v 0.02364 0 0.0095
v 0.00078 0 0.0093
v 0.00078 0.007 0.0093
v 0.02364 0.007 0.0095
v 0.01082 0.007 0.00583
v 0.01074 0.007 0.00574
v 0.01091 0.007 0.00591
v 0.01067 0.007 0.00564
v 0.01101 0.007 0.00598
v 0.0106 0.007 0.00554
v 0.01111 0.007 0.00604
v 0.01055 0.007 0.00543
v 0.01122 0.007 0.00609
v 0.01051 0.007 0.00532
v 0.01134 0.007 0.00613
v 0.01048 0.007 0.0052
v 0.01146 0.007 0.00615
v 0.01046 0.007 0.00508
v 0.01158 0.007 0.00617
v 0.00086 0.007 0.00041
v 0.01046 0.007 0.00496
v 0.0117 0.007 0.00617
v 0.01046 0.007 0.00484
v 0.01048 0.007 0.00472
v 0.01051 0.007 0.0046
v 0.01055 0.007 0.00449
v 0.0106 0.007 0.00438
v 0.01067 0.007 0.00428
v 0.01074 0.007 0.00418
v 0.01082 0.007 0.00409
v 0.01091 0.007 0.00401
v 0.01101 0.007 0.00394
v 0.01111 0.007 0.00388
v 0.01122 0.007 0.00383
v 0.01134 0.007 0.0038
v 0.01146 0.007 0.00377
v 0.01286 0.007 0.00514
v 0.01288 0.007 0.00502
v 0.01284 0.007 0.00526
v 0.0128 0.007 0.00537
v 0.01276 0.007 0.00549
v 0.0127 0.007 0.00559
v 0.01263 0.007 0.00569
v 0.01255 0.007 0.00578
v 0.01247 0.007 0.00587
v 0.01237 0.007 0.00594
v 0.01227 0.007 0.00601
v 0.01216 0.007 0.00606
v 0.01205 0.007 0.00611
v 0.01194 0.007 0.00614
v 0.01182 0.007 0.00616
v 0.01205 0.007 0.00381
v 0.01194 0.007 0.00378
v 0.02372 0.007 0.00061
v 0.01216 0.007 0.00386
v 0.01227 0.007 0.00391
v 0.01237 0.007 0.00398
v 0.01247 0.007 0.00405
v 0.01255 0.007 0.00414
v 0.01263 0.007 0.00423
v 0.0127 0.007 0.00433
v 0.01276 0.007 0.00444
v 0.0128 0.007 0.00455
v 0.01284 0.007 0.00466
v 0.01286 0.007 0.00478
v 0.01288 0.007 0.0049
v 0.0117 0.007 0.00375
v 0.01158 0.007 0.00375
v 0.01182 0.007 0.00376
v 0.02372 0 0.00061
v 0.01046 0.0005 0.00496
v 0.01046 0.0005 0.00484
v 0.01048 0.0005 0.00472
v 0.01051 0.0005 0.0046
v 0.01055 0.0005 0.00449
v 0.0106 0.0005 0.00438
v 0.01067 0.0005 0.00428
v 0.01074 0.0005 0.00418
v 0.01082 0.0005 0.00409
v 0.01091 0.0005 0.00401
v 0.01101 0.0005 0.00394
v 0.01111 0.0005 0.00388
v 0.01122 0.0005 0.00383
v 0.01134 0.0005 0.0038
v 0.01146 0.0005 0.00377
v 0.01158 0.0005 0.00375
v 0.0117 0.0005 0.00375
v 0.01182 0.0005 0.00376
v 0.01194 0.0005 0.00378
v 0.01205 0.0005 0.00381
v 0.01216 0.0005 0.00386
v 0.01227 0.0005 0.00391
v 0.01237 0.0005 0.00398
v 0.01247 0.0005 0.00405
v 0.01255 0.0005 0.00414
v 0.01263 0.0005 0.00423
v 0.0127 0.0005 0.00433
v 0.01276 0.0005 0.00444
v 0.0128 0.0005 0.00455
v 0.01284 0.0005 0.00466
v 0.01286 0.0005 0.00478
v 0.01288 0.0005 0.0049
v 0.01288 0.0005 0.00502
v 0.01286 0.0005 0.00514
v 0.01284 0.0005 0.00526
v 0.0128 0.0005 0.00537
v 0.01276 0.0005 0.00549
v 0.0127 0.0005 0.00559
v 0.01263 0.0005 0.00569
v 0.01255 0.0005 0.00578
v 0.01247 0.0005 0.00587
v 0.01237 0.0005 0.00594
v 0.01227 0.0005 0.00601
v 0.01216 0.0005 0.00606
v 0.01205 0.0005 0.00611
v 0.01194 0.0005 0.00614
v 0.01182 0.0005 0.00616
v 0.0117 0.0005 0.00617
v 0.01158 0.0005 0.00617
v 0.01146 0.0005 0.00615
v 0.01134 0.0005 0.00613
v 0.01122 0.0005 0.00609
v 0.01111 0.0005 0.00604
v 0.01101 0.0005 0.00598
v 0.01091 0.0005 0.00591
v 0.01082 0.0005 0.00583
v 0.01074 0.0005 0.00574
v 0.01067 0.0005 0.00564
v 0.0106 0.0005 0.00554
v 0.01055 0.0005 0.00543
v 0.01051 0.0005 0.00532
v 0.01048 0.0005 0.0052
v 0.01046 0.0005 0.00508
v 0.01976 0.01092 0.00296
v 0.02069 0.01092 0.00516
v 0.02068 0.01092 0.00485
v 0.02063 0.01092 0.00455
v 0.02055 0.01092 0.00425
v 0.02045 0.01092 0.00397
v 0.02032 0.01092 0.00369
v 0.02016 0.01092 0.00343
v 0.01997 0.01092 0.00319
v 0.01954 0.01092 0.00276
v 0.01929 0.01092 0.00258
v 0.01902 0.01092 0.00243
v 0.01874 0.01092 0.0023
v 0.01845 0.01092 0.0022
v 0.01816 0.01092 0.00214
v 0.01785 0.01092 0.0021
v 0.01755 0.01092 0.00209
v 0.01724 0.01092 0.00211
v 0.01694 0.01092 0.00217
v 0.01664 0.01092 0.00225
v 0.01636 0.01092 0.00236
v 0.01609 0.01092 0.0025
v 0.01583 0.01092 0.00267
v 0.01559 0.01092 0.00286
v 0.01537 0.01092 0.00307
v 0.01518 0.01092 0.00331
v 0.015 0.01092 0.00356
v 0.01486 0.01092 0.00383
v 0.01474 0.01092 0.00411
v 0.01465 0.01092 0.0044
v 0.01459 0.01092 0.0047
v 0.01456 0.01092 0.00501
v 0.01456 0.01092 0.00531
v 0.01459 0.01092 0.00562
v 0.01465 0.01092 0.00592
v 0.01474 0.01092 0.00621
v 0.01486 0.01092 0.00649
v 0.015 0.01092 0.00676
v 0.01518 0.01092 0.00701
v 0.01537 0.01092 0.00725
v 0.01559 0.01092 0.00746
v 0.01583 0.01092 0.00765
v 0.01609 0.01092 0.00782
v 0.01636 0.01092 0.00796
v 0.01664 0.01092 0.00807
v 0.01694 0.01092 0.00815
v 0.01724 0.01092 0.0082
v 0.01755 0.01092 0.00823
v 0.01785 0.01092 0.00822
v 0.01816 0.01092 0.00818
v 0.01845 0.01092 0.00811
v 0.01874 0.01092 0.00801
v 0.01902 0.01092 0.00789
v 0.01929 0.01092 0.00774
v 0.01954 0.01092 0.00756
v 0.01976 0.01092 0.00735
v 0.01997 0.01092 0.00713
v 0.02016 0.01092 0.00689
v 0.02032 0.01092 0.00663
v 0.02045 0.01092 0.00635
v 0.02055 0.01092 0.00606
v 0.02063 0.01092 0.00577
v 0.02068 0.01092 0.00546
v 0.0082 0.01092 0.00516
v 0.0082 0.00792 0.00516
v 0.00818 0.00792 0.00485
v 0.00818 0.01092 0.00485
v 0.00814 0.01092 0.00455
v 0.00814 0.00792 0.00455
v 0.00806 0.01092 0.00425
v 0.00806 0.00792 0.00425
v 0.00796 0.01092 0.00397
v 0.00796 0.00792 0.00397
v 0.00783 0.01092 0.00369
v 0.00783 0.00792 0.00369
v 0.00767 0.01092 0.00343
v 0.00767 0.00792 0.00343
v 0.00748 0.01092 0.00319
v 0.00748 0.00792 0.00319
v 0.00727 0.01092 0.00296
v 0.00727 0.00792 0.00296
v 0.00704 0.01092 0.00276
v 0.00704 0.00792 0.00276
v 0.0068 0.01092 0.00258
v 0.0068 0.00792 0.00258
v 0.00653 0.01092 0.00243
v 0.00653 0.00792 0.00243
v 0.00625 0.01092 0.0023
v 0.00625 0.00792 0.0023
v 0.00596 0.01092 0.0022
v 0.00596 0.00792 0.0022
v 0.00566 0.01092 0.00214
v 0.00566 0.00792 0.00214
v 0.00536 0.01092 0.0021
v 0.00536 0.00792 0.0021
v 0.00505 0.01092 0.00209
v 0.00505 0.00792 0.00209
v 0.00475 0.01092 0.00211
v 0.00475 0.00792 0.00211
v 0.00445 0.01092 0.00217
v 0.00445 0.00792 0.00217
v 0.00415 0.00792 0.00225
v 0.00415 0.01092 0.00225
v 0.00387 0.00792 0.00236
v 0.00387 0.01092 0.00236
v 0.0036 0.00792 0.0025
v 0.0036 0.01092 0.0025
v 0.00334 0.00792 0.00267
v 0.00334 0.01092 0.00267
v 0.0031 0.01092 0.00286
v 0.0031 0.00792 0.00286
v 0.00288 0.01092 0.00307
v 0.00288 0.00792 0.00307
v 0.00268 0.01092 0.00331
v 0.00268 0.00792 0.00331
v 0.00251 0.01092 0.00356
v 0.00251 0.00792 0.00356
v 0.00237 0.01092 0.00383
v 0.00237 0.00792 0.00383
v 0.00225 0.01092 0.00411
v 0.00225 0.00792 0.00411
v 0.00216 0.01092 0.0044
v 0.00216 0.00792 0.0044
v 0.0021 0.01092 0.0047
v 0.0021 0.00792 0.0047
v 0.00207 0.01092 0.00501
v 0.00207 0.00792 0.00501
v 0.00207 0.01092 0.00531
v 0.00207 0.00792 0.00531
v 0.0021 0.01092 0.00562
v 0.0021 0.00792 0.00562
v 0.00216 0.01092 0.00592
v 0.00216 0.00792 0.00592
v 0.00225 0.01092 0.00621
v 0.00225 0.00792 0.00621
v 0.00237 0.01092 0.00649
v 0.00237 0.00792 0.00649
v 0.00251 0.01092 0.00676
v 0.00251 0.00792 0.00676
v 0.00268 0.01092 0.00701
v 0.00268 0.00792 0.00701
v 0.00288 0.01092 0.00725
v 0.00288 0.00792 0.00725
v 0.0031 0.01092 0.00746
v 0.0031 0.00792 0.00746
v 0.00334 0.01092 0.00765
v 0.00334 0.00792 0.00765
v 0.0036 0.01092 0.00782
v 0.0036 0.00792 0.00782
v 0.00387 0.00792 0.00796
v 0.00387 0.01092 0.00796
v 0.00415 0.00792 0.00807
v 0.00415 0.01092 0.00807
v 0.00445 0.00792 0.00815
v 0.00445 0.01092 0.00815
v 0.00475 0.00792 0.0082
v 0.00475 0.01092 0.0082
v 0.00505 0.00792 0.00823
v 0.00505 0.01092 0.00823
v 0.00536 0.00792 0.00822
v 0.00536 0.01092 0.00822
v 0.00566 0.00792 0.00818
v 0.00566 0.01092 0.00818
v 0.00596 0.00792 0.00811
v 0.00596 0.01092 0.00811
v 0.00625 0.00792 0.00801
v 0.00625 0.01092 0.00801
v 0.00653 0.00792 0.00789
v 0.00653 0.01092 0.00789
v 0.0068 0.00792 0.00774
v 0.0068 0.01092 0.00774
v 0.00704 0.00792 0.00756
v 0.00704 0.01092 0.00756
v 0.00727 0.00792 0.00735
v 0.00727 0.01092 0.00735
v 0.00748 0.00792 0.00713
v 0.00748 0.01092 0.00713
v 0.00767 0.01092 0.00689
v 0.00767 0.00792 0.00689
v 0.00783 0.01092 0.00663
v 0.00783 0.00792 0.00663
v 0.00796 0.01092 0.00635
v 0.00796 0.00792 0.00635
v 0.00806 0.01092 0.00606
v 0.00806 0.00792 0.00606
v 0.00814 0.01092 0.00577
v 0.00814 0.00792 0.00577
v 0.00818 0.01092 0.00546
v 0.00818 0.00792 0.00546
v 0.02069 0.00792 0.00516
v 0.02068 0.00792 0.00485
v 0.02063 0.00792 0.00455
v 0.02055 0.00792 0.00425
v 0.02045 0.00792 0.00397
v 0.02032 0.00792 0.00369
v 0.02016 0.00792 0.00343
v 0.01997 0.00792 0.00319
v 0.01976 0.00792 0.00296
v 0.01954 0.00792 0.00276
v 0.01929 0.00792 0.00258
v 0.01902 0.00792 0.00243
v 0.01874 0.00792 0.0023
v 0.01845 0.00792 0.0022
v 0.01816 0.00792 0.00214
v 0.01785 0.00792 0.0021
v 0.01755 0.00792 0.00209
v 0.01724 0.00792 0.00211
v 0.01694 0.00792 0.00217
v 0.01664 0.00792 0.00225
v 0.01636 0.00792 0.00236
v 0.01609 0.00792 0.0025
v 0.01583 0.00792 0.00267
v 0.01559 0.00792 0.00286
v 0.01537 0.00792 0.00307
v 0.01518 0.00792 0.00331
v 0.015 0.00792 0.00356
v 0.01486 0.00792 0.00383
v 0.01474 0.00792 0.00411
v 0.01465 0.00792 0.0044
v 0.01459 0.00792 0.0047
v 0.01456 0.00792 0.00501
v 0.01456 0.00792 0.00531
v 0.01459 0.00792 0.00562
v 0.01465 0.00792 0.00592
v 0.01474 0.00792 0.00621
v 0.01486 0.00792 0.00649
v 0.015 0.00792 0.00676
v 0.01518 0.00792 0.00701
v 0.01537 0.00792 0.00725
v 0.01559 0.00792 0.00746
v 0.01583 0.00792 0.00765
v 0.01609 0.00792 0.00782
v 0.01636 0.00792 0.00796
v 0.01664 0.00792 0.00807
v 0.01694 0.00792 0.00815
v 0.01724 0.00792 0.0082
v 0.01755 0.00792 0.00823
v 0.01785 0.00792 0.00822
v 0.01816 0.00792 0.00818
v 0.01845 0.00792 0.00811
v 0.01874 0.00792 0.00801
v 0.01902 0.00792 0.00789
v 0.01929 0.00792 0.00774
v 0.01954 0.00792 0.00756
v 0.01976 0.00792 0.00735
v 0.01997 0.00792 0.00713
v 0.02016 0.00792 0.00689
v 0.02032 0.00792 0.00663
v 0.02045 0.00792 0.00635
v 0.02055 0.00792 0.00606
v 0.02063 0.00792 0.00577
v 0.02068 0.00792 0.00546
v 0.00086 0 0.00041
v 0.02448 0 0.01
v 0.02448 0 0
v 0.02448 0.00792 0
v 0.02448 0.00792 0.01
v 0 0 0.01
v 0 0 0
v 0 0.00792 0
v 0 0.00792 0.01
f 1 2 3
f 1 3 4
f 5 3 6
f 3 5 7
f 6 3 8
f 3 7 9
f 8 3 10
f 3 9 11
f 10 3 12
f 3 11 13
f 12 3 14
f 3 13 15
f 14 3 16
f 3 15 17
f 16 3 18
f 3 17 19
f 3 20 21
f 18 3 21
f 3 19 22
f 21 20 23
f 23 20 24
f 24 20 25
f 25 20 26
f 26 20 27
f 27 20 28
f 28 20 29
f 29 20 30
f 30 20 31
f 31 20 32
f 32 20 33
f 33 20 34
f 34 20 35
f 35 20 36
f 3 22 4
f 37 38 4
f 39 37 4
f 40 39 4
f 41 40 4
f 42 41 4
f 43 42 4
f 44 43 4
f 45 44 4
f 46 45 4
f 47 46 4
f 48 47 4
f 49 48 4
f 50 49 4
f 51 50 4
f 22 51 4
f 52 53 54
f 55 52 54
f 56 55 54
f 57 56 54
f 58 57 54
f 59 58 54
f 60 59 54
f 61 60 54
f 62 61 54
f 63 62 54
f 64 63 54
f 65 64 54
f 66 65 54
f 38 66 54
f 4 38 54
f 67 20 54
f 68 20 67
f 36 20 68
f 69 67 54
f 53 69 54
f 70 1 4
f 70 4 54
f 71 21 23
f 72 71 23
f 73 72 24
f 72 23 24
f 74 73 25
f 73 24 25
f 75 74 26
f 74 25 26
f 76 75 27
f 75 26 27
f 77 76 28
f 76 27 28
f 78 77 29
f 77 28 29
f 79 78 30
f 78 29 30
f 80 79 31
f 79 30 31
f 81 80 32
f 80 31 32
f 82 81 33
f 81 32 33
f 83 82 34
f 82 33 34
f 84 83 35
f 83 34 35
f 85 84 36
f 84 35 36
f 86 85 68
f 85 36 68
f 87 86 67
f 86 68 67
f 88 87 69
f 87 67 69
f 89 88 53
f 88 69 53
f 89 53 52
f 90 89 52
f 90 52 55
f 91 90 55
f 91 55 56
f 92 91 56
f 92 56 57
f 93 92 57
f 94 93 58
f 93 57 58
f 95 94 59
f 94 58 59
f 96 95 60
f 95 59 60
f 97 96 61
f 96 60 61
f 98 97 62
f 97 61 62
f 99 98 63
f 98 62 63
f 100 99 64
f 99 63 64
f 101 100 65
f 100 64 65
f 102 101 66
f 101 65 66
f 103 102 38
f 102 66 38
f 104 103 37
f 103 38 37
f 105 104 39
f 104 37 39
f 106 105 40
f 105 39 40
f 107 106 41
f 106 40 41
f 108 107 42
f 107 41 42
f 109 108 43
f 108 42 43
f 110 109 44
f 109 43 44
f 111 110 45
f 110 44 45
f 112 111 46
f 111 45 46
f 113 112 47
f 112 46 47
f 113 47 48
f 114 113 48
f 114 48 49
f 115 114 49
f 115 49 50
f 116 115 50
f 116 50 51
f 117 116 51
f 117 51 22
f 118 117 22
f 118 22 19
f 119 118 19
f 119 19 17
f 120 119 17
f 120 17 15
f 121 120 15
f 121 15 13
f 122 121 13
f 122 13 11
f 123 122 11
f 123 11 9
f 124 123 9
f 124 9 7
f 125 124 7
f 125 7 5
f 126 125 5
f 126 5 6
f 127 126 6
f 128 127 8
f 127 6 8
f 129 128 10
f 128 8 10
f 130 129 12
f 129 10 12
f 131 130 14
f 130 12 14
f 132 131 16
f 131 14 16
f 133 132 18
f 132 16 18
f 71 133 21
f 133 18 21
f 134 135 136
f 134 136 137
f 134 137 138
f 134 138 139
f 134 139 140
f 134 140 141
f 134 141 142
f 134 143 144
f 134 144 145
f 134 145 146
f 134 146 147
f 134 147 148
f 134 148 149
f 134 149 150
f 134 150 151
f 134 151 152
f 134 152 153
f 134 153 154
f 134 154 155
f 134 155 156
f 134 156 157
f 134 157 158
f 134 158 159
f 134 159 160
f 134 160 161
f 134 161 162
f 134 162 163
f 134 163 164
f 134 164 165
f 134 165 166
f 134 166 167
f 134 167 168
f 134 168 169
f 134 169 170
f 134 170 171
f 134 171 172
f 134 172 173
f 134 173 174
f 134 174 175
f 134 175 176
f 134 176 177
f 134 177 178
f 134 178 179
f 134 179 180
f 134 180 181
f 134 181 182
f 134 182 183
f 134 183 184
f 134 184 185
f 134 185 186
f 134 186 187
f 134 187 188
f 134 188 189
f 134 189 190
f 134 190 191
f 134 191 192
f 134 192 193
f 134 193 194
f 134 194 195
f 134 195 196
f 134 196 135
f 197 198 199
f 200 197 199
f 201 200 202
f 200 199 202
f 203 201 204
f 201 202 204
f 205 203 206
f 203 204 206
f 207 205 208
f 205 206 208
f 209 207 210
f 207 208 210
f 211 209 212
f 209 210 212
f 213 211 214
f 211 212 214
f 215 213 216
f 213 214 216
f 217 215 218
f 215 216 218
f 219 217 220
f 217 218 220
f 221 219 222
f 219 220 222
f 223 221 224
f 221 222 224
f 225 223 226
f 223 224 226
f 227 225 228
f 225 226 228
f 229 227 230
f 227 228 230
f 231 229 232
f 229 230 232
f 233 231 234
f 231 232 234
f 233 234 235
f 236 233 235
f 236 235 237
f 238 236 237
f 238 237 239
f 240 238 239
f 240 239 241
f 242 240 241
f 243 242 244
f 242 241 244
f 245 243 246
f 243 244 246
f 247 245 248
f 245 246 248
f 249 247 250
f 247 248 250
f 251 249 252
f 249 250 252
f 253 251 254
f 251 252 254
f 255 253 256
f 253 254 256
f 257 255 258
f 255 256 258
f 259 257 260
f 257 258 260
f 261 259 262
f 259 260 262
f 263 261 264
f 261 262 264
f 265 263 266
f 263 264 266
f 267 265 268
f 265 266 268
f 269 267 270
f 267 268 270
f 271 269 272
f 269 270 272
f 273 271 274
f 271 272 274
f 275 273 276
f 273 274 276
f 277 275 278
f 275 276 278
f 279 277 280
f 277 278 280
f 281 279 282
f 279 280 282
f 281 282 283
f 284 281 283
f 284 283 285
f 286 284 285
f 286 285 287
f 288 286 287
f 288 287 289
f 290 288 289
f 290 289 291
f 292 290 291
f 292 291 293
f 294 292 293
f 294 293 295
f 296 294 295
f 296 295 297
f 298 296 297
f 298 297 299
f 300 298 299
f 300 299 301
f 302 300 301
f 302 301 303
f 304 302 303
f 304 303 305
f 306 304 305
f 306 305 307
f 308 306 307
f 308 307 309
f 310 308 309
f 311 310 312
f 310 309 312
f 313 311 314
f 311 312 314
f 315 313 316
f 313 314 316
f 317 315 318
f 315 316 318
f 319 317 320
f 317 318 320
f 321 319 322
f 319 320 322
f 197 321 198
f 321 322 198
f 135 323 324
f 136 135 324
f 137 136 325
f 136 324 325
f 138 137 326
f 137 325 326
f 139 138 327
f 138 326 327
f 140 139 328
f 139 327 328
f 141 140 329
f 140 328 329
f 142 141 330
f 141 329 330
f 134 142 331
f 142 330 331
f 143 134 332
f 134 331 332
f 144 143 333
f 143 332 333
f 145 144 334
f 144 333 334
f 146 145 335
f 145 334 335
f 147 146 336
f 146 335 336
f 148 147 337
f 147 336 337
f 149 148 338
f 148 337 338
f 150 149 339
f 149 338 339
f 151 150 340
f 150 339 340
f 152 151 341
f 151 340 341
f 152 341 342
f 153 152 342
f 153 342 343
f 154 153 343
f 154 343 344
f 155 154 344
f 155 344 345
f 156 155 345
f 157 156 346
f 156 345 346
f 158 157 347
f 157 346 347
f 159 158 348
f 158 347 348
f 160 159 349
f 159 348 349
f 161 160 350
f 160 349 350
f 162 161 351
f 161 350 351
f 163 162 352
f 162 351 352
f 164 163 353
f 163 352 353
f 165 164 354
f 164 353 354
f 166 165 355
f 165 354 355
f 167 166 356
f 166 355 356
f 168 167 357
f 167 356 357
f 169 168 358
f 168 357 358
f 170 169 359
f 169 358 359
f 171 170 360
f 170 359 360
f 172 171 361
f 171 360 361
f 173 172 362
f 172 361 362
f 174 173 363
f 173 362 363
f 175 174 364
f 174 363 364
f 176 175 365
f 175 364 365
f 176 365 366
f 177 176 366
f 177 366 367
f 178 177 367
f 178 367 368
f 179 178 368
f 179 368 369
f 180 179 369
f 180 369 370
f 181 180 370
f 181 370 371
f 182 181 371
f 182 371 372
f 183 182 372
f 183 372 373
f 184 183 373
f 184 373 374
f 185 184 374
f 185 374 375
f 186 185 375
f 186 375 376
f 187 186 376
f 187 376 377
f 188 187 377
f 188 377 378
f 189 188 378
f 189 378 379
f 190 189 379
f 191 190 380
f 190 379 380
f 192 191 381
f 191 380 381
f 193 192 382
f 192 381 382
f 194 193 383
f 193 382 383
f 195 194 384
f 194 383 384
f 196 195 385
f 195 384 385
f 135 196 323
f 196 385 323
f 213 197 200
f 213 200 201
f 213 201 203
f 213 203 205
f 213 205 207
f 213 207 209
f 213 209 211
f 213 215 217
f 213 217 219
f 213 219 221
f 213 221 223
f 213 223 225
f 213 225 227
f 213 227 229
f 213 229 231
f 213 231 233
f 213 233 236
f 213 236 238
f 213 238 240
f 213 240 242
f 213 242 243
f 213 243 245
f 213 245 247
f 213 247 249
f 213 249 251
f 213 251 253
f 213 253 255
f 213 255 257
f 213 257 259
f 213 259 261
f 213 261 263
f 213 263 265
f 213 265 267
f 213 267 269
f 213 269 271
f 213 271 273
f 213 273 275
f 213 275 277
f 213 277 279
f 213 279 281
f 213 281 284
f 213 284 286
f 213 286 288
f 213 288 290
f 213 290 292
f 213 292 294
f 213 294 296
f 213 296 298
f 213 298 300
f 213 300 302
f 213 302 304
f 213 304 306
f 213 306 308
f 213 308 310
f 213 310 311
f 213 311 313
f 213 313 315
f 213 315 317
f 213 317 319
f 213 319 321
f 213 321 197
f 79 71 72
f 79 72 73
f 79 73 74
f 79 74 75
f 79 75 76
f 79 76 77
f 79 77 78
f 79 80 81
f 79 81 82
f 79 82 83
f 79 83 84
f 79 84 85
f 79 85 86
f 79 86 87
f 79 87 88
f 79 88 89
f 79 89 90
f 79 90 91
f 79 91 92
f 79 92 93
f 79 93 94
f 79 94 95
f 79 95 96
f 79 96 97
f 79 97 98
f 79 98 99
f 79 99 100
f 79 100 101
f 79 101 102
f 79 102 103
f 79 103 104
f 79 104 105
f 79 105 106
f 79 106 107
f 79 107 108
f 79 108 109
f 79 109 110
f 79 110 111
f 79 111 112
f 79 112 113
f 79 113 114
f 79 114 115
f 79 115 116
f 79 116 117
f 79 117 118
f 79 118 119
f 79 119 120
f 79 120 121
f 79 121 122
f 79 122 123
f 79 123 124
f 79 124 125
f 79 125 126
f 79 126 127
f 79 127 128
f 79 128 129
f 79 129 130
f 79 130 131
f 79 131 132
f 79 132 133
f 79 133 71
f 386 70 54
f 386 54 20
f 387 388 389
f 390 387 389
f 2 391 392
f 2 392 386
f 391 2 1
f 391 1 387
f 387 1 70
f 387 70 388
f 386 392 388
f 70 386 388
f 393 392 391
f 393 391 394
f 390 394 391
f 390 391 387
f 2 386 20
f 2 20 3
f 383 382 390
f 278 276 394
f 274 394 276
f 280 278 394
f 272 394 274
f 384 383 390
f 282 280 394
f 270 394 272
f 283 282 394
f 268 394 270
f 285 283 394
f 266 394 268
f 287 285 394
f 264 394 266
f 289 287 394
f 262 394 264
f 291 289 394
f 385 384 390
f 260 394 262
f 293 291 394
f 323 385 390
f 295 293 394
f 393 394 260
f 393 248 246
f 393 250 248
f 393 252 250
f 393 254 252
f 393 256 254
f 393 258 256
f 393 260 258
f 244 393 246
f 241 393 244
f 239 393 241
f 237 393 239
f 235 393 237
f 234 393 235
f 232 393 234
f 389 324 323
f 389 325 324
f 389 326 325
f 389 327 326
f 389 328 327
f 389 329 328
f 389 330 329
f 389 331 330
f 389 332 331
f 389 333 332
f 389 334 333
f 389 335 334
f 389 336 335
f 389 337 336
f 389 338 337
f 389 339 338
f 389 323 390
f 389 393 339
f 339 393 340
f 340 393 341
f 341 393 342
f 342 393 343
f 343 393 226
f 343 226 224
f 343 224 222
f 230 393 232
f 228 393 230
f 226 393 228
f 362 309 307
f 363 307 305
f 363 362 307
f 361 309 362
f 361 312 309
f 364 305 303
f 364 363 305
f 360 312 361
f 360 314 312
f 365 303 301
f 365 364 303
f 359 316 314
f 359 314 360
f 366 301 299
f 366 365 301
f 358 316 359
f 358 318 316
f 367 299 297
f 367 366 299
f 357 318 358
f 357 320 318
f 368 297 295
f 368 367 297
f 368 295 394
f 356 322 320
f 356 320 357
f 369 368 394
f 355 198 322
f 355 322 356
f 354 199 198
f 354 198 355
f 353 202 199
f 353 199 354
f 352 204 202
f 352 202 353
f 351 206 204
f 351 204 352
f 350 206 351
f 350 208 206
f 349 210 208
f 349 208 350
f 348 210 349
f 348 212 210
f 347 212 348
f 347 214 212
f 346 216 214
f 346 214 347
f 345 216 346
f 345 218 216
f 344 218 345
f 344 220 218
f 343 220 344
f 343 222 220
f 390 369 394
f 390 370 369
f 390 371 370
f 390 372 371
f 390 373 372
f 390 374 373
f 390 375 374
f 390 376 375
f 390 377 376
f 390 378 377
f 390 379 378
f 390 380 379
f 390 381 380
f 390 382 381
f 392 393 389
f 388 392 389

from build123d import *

# Parameters (mm, degrees)
ESQUISSE1_W             = 0.024479563
ESQUISSE1_H             = 0.007919518
BOSS_EXTRU_2_DEPTH      = 0.01
ENL_V_MAT_EXTRU_2_DEPTH = 0.007
ESQUISSE4_R             = 0.003068472
ESQUISSE4_R_2           = 0.003068475
BOSS_EXTRU_3_DEPTH      = 0.003
ESQUISSE5_R             = 0.001210602
BOSS_EXTRU_4_DEPTH      = 0.0065


with BuildPart() as part:
    # Esquisse1 → Boss.-Extru.2 (new body)
    with BuildSketch(Plane.XY):
        with Locations((0.012239782, 0.003959759)):
            Rectangle(ESQUISSE1_W, ESQUISSE1_H)
    extrude(amount=BOSS_EXTRU_2_DEPTH)

    # Esquisse3 → Enlèv. mat.-Extru.2 (cut)
    with BuildSketch(Plane(origin=(0, 0, 0), x_dir=(-1, 0, 0), z_dir=(0, -1, 0))):
        Polygon((-0.000784109, -0.009303073), (-0.023637888, -0.009504555), (-0.02371631, -0.000609239), (-0.000862531, -0.000407757), align=None)
    extrude(amount=-ENL_V_MAT_EXTRU_2_DEPTH, mode=Mode.SUBTRACT)

    # Esquisse4 → Boss.-Extru.3 (add)
    with BuildSketch(Plane(origin=(0, 0.007919518, 0), x_dir=(1, 0, 0), z_dir=(0, 1, 0))):
        with Locations((0.005130357, -0.005158307)):
            Circle(ESQUISSE4_R)
        with Locations((0.017622221, -0.005158307)):
            Circle(ESQUISSE4_R_2)
    extrude(amount=BOSS_EXTRU_3_DEPTH)

    # Esquisse5 → Boss.-Extru.4 (add)
    with BuildSketch(Plane(origin=(0, 0.007, 0), x_dir=(-1, 0, 0), z_dir=(0, -1, 0))):
        with Locations((-0.011667014, -0.004960674)):
            Circle(ESQUISSE5_R)
    extrude(amount=BOSS_EXTRU_4_DEPTH)


solid = part.part
